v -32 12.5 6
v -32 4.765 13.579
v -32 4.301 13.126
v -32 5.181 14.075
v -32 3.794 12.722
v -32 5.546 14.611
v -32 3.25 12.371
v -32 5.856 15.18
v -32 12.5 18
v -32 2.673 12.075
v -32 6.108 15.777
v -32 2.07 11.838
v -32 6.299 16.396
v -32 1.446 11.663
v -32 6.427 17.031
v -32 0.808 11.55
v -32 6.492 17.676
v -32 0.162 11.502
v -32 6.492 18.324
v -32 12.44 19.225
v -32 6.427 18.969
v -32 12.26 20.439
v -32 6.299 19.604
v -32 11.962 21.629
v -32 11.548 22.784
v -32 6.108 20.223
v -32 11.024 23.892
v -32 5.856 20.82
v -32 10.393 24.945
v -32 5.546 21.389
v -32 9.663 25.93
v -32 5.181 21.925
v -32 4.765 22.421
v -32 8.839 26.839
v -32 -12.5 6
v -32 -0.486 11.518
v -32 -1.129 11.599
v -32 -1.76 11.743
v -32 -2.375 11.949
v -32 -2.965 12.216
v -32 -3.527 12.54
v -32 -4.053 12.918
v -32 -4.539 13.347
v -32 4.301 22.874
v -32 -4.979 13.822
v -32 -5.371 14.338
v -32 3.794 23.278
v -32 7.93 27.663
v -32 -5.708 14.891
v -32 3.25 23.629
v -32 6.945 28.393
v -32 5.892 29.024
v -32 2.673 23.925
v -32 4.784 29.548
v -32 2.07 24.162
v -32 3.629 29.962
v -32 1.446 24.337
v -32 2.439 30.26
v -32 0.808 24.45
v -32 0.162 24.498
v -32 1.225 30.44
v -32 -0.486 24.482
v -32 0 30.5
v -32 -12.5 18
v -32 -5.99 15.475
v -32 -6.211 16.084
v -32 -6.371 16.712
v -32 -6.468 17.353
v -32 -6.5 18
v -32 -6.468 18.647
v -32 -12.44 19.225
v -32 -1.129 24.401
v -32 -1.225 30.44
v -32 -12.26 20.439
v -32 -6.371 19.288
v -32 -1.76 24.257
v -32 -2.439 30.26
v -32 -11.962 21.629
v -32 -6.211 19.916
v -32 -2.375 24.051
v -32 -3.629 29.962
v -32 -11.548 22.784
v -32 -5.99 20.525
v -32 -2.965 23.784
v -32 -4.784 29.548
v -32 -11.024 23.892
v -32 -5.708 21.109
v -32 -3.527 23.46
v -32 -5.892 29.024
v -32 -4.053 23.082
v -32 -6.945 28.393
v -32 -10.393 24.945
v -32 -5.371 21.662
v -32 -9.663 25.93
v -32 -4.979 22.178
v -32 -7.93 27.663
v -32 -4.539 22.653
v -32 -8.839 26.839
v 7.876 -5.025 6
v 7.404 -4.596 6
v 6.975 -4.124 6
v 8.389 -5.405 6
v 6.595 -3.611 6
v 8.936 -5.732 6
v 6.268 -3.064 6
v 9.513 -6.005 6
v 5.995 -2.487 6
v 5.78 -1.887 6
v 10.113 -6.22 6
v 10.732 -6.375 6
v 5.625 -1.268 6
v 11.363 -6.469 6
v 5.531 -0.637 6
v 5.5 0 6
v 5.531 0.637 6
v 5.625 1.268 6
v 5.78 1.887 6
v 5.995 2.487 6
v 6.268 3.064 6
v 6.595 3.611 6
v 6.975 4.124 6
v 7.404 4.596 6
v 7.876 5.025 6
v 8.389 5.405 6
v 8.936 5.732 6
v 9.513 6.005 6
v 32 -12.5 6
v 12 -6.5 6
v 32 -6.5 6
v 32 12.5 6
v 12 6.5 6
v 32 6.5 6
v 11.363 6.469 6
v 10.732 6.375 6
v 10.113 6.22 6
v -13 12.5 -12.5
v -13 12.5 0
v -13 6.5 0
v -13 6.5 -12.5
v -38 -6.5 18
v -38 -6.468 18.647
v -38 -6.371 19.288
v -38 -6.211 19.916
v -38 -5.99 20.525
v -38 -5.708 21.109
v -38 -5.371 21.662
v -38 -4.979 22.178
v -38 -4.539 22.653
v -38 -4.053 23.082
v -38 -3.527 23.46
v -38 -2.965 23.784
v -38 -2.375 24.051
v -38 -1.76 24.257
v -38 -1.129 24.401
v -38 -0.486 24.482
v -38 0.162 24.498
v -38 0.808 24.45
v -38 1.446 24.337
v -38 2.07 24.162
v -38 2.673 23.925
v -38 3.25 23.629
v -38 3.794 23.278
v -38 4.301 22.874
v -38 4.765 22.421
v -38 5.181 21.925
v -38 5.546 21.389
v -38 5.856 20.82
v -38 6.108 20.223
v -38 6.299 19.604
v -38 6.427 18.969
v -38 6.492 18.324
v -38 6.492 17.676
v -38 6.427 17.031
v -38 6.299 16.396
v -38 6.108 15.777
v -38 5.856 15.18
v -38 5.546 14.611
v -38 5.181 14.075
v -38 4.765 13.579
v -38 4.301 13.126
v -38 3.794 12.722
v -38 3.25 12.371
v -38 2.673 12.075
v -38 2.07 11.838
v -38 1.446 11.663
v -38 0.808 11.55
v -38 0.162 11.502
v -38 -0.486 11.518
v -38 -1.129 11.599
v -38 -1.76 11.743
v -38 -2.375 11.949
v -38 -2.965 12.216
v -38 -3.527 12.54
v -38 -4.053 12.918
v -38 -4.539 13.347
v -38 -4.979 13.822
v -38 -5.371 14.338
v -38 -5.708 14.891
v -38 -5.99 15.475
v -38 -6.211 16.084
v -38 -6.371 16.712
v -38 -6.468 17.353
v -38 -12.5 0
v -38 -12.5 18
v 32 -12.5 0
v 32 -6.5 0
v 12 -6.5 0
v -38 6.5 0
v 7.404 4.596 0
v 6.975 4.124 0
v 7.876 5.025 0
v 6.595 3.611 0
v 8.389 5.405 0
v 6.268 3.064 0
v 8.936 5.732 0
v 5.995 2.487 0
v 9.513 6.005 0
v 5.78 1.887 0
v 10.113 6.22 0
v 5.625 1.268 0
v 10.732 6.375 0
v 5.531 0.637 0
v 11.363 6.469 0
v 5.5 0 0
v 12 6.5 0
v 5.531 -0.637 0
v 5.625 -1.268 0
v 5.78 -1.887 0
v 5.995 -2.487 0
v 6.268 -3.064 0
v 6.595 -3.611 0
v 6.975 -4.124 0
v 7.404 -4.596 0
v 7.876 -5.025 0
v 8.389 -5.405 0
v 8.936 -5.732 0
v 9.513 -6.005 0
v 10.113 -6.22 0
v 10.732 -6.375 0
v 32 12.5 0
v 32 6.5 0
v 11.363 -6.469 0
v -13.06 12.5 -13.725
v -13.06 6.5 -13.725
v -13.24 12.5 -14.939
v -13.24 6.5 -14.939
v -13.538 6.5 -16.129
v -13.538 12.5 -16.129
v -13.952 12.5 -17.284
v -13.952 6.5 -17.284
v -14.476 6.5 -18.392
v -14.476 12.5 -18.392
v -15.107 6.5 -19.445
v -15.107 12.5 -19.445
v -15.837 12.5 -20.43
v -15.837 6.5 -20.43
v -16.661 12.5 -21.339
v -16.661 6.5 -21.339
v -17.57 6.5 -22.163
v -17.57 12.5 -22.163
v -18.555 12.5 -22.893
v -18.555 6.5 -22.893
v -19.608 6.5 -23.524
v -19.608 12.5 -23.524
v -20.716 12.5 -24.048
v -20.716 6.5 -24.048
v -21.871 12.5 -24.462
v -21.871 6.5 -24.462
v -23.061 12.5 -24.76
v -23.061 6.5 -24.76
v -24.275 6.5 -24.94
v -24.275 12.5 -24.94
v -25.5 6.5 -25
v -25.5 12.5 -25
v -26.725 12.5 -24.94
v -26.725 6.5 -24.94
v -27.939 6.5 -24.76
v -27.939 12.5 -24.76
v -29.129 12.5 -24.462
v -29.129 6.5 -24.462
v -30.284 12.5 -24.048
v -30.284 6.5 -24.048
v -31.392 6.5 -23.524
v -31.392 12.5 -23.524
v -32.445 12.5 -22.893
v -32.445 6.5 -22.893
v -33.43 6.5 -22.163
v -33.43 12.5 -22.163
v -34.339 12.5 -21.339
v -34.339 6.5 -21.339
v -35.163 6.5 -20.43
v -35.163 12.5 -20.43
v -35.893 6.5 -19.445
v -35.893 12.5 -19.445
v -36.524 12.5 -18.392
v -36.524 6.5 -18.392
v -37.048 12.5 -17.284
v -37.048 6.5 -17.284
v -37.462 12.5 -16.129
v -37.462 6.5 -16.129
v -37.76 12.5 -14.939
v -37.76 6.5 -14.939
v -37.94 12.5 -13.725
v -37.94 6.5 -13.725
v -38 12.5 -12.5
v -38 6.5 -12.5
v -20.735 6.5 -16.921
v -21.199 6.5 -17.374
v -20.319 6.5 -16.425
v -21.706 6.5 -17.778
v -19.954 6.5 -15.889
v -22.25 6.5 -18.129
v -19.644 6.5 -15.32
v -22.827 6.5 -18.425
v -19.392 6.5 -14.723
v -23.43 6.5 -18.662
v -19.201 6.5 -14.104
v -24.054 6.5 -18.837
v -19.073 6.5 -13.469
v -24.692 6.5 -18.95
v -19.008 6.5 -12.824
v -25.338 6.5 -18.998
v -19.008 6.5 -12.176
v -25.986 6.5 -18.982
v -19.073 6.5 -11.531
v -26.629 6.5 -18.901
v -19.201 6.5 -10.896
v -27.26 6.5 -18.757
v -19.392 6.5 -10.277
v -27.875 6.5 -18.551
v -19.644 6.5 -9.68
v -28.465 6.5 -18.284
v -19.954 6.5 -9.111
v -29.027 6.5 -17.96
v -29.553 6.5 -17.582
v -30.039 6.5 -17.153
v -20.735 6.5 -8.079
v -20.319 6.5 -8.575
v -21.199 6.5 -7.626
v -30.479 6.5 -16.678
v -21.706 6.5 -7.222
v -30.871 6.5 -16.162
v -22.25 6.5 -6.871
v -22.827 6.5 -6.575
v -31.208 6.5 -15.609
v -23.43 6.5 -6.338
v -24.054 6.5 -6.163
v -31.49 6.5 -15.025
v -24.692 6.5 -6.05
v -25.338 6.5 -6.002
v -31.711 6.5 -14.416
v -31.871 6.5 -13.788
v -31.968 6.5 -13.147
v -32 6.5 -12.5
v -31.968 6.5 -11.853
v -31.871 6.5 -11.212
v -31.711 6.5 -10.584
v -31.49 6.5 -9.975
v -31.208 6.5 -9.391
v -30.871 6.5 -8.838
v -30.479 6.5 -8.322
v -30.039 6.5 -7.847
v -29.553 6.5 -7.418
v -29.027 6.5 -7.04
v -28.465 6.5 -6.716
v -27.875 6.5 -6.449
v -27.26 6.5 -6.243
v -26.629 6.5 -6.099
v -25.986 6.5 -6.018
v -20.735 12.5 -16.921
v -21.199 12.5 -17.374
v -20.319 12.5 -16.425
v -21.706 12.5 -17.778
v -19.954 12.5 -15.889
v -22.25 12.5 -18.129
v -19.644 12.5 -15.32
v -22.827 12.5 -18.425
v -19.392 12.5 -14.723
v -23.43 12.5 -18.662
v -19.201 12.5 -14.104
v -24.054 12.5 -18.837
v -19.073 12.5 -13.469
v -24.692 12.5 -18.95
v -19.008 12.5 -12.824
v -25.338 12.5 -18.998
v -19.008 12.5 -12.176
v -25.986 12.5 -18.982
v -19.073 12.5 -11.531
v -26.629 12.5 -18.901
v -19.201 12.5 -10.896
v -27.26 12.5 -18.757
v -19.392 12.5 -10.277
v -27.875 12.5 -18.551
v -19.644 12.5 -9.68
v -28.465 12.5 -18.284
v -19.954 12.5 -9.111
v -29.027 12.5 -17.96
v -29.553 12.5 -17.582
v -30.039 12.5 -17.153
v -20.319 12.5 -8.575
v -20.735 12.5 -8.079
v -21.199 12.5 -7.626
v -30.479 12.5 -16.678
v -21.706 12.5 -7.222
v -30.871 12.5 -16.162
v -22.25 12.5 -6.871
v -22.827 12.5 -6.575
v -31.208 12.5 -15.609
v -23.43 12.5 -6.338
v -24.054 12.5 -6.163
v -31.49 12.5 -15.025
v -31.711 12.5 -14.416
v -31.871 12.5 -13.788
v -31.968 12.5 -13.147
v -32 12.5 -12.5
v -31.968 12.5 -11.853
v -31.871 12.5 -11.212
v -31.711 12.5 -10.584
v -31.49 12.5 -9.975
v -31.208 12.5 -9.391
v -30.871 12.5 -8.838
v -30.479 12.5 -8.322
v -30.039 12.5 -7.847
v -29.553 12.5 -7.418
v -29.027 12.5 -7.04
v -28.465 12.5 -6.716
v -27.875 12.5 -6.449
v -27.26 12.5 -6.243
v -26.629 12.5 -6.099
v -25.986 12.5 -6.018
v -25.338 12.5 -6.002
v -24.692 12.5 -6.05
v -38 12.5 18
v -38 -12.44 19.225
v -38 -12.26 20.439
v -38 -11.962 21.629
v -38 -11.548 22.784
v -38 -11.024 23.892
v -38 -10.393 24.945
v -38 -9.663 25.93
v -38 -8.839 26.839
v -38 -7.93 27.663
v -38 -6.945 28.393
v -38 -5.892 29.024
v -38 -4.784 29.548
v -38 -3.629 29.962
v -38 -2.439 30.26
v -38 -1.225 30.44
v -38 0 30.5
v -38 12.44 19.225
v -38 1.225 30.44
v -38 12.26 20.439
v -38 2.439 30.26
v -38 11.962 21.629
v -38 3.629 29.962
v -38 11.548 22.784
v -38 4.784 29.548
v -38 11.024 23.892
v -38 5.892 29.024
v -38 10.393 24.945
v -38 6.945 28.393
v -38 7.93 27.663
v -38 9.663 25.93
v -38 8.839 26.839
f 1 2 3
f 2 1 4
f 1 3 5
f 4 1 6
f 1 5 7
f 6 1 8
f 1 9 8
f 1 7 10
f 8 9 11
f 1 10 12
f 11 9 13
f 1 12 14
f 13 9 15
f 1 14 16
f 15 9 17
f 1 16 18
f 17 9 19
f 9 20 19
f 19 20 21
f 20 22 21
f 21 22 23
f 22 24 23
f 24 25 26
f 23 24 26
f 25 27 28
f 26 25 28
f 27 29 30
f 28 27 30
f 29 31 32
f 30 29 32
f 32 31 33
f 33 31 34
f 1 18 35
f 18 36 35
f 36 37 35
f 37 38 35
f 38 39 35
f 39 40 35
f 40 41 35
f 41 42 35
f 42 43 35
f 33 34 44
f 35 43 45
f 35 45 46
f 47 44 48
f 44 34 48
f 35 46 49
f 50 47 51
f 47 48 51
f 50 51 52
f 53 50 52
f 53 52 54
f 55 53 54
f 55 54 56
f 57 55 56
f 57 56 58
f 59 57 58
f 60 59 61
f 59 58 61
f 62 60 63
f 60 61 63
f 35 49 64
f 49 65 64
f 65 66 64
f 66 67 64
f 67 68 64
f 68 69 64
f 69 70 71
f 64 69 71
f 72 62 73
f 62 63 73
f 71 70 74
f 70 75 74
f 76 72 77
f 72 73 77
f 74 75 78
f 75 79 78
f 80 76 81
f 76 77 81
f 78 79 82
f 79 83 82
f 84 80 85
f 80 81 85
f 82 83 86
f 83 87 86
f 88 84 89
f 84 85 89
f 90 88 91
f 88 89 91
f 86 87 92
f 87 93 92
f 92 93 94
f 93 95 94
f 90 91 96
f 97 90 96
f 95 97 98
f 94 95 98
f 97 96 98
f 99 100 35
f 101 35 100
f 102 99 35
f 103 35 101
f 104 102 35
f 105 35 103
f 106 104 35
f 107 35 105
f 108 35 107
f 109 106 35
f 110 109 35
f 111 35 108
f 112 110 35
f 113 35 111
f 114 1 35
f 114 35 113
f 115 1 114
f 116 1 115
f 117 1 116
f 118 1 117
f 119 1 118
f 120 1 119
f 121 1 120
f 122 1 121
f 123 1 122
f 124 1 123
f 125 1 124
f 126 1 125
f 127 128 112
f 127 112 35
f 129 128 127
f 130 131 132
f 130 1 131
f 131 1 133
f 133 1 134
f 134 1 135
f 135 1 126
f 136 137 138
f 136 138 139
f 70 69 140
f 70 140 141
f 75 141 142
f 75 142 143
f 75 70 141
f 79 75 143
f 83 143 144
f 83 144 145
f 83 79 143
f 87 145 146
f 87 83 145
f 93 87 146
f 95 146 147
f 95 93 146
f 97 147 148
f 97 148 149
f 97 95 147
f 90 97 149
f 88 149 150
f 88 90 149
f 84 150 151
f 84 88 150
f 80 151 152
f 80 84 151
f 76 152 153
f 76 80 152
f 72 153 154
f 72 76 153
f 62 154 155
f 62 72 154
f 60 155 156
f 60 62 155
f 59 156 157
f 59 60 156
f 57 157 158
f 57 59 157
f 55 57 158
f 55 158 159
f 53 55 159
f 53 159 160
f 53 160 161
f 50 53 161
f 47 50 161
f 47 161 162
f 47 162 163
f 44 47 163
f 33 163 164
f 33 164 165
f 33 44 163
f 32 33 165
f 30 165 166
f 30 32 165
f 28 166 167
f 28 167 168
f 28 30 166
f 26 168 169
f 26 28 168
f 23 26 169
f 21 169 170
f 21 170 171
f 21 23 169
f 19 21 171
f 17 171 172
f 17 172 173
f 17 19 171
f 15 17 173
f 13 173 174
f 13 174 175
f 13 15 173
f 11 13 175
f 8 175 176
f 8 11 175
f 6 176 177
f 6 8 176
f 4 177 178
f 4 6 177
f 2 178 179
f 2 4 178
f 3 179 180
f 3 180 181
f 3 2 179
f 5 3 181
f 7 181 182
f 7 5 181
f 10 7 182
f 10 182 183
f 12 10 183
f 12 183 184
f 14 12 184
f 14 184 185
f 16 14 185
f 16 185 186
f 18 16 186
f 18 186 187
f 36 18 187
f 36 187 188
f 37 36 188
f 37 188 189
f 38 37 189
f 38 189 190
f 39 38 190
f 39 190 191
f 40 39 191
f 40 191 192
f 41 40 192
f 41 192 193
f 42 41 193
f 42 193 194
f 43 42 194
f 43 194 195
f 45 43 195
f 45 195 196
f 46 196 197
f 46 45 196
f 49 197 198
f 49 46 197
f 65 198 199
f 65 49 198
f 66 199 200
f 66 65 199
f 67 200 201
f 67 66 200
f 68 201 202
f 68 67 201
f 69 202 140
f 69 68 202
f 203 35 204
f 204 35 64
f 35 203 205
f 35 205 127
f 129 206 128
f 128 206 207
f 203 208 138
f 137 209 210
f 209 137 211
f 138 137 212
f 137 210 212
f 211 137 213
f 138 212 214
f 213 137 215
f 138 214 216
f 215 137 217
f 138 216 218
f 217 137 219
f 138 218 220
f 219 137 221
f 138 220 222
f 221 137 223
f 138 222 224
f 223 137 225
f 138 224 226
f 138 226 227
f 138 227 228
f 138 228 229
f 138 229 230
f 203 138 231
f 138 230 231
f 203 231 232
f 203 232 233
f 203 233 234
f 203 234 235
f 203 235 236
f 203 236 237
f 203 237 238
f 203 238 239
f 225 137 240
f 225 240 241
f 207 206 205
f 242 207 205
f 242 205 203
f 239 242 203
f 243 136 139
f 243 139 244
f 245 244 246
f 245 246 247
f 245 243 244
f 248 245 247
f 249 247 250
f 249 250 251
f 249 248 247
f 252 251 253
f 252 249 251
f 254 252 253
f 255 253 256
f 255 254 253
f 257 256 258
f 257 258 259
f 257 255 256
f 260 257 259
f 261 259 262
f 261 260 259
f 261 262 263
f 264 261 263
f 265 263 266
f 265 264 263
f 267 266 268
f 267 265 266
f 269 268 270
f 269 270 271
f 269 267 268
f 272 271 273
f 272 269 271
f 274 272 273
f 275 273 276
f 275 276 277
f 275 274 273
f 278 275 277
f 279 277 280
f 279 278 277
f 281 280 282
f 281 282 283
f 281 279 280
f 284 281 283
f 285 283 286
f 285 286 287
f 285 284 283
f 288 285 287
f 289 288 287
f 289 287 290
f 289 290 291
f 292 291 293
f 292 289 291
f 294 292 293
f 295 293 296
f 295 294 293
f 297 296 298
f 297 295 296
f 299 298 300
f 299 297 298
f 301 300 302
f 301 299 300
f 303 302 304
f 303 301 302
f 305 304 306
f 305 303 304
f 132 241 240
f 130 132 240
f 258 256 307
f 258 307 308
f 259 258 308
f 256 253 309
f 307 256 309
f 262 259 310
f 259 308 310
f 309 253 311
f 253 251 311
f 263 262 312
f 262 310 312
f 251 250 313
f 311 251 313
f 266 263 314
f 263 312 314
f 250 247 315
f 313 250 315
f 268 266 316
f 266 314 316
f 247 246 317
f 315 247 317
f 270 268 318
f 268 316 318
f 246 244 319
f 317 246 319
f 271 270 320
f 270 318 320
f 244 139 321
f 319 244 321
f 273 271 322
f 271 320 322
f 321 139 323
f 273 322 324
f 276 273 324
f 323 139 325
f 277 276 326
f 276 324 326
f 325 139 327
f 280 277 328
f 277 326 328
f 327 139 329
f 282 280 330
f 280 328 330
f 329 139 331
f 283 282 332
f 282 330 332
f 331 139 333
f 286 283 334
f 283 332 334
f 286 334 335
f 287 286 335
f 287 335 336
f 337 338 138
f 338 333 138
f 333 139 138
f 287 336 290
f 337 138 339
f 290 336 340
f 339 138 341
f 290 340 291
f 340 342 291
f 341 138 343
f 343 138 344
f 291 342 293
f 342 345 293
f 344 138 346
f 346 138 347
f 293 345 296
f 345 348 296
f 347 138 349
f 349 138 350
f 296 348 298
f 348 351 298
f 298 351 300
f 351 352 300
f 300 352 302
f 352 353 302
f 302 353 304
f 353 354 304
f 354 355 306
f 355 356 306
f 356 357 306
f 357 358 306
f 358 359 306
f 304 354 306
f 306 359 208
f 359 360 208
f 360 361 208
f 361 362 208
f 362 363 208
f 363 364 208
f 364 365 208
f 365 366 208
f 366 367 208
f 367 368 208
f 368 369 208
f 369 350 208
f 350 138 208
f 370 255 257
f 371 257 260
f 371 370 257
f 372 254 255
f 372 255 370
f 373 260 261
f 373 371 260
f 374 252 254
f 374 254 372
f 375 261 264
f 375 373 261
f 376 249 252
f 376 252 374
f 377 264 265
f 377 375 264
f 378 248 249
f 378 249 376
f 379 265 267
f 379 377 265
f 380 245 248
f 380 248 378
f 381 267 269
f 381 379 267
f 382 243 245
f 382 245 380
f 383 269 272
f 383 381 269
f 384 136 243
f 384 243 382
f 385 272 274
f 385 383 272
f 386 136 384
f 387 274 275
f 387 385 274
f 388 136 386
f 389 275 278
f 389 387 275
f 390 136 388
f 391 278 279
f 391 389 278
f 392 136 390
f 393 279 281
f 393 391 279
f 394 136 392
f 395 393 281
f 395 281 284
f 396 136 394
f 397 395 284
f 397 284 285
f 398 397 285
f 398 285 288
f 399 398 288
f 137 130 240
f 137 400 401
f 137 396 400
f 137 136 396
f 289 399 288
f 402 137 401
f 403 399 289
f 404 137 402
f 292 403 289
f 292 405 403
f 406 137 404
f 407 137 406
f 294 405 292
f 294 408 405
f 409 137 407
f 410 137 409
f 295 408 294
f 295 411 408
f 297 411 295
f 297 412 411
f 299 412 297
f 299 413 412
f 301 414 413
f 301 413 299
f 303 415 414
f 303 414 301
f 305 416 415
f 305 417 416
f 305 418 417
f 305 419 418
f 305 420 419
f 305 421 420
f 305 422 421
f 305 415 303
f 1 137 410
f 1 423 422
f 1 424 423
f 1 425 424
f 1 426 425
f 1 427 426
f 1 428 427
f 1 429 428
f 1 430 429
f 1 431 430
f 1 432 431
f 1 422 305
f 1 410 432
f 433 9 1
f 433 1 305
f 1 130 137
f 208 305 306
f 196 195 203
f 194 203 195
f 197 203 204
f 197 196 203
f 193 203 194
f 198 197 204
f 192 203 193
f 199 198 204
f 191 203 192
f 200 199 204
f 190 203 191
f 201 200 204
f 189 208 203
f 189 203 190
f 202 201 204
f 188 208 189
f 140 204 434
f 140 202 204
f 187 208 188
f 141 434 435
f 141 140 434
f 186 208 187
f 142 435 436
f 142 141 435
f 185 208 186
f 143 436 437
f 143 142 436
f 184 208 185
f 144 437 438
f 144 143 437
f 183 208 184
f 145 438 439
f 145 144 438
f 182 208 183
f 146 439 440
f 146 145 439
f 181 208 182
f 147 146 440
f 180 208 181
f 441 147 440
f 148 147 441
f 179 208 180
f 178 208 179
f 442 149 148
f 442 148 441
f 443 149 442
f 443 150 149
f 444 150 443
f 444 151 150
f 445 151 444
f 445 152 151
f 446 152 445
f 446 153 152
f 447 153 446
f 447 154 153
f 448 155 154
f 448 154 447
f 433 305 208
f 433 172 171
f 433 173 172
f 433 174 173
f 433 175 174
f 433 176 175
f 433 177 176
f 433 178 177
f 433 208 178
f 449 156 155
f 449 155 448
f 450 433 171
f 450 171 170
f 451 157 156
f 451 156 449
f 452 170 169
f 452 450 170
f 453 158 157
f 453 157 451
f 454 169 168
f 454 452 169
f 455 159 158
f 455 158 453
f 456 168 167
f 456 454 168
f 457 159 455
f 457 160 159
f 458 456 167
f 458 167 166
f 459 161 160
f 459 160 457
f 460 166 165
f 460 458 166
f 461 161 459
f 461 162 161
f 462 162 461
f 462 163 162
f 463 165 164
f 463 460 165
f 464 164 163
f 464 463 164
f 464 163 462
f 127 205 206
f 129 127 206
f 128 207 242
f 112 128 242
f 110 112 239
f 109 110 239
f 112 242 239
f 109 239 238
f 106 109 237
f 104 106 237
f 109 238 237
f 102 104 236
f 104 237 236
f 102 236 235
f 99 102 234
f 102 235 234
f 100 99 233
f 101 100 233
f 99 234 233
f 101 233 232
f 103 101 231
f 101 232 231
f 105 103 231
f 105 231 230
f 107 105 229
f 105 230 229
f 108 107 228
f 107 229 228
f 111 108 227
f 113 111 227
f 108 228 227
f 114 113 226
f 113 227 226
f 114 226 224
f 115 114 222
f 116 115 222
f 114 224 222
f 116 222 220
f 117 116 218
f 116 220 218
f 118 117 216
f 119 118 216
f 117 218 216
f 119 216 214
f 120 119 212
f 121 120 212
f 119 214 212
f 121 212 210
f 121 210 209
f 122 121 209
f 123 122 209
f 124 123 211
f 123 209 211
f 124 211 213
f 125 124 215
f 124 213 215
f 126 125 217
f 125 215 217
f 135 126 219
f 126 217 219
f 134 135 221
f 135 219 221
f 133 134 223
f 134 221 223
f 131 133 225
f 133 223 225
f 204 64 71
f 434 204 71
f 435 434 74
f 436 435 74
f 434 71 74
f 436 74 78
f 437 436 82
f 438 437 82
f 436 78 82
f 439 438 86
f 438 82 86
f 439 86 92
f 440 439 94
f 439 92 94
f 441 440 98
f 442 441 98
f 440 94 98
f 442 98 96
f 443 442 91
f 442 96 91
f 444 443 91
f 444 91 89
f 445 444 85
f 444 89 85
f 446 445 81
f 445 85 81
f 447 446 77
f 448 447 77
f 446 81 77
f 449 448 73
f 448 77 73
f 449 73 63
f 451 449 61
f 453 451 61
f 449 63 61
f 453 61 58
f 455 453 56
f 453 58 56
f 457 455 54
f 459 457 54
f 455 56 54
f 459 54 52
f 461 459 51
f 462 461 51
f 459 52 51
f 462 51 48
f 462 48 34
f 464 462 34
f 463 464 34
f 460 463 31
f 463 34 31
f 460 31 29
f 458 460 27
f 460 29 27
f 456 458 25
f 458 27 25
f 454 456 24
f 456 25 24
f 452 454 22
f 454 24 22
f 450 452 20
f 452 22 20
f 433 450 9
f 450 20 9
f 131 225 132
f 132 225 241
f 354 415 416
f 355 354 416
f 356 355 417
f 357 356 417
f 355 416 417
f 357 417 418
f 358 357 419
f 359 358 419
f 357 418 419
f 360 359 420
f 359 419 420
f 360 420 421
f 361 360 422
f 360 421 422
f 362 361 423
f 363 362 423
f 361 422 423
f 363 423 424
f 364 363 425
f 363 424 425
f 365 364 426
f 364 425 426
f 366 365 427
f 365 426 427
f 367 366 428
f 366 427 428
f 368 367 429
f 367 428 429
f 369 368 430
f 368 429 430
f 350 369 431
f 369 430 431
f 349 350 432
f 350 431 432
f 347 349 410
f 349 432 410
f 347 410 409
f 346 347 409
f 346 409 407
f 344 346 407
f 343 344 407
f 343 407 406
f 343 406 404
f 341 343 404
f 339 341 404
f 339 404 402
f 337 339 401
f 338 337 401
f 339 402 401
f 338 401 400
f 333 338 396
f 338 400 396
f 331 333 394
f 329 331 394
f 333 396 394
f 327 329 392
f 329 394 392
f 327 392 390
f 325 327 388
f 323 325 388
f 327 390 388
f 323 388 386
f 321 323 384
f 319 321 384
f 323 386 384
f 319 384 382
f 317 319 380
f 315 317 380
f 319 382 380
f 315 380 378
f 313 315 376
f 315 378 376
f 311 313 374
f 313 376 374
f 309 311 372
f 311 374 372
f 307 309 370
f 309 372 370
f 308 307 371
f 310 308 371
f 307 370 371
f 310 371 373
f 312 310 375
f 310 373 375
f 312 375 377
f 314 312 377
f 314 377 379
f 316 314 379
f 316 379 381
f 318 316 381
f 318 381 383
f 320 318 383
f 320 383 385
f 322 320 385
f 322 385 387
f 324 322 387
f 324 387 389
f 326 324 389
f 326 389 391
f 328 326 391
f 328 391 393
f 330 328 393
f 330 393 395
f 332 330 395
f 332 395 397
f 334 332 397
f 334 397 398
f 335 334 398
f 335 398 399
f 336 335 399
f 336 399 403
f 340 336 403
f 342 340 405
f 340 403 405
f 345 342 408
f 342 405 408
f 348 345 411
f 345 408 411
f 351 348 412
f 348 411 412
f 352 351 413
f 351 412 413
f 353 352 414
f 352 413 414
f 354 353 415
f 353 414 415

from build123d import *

# Parameters (mm, degrees)
F1_DEPTH = 6
F2_R     = 6.5
F3_DEPTH = 6
F4_R     = 6.5
F5_DEPTH = 6


with BuildPart() as f1:
    # F0 (on Top) → F1 (new body)
    with BuildSketch(Plane.XY):
        with BuildLine():
            Line((-32, -12.5), (32, -12.5))
            Line((32, -12.5), (32, -6.5))
            Line((32, -6.5), (12, -6.5))
            ThreePointArc((12, -6.5), (5.5, 0), (12, 6.5))
            Line((12, 6.5), (32, 6.5))
            Line((32, 6.5), (32, 12.5))
            Line((32, 12.5), (-32, 12.5))
            Line((-32, 12.5), (-32, -12.5))
        make_face()
    extrude(amount=F1_DEPTH)

    # F2 (on face) → F3 (join)
    with BuildSketch(Plane(origin=(-32, 0, 0), x_dir=(0, -1, 0), z_dir=(-1, 0, 0))):
        with BuildLine():
            Line((-12.5, 18), (-12.5, 0))
            Line((-12.5, 0), (12.5, 0))
            Line((12.5, 0), (12.5, 18))
            ThreePointArc((12.5, 18), (0, 30.5), (-12.5, 18))
        make_face()
        with Locations((0, 18)):
            Circle(F2_R, mode=Mode.SUBTRACT)
    extrude(amount=F3_DEPTH)

    # F4 (on face) → F5 (join)
    with BuildSketch(Plane(origin=(0, 12.5, 0), x_dir=(-1, 0, 0), z_dir=(0, 1, 0))):
        with BuildLine():
            Line((38, -12.5), (38, 0))
            Line((38, 0), (13, 0))
            Line((13, 0), (13, -12.5))
            ThreePointArc((13, -12.5), (25.5, -25), (38, -12.5))
        make_face()
        with Locations((25.5, -12.5)):
            Circle(F4_R, mode=Mode.SUBTRACT)
    extrude(amount=-F5_DEPTH)


solid = f1.part
